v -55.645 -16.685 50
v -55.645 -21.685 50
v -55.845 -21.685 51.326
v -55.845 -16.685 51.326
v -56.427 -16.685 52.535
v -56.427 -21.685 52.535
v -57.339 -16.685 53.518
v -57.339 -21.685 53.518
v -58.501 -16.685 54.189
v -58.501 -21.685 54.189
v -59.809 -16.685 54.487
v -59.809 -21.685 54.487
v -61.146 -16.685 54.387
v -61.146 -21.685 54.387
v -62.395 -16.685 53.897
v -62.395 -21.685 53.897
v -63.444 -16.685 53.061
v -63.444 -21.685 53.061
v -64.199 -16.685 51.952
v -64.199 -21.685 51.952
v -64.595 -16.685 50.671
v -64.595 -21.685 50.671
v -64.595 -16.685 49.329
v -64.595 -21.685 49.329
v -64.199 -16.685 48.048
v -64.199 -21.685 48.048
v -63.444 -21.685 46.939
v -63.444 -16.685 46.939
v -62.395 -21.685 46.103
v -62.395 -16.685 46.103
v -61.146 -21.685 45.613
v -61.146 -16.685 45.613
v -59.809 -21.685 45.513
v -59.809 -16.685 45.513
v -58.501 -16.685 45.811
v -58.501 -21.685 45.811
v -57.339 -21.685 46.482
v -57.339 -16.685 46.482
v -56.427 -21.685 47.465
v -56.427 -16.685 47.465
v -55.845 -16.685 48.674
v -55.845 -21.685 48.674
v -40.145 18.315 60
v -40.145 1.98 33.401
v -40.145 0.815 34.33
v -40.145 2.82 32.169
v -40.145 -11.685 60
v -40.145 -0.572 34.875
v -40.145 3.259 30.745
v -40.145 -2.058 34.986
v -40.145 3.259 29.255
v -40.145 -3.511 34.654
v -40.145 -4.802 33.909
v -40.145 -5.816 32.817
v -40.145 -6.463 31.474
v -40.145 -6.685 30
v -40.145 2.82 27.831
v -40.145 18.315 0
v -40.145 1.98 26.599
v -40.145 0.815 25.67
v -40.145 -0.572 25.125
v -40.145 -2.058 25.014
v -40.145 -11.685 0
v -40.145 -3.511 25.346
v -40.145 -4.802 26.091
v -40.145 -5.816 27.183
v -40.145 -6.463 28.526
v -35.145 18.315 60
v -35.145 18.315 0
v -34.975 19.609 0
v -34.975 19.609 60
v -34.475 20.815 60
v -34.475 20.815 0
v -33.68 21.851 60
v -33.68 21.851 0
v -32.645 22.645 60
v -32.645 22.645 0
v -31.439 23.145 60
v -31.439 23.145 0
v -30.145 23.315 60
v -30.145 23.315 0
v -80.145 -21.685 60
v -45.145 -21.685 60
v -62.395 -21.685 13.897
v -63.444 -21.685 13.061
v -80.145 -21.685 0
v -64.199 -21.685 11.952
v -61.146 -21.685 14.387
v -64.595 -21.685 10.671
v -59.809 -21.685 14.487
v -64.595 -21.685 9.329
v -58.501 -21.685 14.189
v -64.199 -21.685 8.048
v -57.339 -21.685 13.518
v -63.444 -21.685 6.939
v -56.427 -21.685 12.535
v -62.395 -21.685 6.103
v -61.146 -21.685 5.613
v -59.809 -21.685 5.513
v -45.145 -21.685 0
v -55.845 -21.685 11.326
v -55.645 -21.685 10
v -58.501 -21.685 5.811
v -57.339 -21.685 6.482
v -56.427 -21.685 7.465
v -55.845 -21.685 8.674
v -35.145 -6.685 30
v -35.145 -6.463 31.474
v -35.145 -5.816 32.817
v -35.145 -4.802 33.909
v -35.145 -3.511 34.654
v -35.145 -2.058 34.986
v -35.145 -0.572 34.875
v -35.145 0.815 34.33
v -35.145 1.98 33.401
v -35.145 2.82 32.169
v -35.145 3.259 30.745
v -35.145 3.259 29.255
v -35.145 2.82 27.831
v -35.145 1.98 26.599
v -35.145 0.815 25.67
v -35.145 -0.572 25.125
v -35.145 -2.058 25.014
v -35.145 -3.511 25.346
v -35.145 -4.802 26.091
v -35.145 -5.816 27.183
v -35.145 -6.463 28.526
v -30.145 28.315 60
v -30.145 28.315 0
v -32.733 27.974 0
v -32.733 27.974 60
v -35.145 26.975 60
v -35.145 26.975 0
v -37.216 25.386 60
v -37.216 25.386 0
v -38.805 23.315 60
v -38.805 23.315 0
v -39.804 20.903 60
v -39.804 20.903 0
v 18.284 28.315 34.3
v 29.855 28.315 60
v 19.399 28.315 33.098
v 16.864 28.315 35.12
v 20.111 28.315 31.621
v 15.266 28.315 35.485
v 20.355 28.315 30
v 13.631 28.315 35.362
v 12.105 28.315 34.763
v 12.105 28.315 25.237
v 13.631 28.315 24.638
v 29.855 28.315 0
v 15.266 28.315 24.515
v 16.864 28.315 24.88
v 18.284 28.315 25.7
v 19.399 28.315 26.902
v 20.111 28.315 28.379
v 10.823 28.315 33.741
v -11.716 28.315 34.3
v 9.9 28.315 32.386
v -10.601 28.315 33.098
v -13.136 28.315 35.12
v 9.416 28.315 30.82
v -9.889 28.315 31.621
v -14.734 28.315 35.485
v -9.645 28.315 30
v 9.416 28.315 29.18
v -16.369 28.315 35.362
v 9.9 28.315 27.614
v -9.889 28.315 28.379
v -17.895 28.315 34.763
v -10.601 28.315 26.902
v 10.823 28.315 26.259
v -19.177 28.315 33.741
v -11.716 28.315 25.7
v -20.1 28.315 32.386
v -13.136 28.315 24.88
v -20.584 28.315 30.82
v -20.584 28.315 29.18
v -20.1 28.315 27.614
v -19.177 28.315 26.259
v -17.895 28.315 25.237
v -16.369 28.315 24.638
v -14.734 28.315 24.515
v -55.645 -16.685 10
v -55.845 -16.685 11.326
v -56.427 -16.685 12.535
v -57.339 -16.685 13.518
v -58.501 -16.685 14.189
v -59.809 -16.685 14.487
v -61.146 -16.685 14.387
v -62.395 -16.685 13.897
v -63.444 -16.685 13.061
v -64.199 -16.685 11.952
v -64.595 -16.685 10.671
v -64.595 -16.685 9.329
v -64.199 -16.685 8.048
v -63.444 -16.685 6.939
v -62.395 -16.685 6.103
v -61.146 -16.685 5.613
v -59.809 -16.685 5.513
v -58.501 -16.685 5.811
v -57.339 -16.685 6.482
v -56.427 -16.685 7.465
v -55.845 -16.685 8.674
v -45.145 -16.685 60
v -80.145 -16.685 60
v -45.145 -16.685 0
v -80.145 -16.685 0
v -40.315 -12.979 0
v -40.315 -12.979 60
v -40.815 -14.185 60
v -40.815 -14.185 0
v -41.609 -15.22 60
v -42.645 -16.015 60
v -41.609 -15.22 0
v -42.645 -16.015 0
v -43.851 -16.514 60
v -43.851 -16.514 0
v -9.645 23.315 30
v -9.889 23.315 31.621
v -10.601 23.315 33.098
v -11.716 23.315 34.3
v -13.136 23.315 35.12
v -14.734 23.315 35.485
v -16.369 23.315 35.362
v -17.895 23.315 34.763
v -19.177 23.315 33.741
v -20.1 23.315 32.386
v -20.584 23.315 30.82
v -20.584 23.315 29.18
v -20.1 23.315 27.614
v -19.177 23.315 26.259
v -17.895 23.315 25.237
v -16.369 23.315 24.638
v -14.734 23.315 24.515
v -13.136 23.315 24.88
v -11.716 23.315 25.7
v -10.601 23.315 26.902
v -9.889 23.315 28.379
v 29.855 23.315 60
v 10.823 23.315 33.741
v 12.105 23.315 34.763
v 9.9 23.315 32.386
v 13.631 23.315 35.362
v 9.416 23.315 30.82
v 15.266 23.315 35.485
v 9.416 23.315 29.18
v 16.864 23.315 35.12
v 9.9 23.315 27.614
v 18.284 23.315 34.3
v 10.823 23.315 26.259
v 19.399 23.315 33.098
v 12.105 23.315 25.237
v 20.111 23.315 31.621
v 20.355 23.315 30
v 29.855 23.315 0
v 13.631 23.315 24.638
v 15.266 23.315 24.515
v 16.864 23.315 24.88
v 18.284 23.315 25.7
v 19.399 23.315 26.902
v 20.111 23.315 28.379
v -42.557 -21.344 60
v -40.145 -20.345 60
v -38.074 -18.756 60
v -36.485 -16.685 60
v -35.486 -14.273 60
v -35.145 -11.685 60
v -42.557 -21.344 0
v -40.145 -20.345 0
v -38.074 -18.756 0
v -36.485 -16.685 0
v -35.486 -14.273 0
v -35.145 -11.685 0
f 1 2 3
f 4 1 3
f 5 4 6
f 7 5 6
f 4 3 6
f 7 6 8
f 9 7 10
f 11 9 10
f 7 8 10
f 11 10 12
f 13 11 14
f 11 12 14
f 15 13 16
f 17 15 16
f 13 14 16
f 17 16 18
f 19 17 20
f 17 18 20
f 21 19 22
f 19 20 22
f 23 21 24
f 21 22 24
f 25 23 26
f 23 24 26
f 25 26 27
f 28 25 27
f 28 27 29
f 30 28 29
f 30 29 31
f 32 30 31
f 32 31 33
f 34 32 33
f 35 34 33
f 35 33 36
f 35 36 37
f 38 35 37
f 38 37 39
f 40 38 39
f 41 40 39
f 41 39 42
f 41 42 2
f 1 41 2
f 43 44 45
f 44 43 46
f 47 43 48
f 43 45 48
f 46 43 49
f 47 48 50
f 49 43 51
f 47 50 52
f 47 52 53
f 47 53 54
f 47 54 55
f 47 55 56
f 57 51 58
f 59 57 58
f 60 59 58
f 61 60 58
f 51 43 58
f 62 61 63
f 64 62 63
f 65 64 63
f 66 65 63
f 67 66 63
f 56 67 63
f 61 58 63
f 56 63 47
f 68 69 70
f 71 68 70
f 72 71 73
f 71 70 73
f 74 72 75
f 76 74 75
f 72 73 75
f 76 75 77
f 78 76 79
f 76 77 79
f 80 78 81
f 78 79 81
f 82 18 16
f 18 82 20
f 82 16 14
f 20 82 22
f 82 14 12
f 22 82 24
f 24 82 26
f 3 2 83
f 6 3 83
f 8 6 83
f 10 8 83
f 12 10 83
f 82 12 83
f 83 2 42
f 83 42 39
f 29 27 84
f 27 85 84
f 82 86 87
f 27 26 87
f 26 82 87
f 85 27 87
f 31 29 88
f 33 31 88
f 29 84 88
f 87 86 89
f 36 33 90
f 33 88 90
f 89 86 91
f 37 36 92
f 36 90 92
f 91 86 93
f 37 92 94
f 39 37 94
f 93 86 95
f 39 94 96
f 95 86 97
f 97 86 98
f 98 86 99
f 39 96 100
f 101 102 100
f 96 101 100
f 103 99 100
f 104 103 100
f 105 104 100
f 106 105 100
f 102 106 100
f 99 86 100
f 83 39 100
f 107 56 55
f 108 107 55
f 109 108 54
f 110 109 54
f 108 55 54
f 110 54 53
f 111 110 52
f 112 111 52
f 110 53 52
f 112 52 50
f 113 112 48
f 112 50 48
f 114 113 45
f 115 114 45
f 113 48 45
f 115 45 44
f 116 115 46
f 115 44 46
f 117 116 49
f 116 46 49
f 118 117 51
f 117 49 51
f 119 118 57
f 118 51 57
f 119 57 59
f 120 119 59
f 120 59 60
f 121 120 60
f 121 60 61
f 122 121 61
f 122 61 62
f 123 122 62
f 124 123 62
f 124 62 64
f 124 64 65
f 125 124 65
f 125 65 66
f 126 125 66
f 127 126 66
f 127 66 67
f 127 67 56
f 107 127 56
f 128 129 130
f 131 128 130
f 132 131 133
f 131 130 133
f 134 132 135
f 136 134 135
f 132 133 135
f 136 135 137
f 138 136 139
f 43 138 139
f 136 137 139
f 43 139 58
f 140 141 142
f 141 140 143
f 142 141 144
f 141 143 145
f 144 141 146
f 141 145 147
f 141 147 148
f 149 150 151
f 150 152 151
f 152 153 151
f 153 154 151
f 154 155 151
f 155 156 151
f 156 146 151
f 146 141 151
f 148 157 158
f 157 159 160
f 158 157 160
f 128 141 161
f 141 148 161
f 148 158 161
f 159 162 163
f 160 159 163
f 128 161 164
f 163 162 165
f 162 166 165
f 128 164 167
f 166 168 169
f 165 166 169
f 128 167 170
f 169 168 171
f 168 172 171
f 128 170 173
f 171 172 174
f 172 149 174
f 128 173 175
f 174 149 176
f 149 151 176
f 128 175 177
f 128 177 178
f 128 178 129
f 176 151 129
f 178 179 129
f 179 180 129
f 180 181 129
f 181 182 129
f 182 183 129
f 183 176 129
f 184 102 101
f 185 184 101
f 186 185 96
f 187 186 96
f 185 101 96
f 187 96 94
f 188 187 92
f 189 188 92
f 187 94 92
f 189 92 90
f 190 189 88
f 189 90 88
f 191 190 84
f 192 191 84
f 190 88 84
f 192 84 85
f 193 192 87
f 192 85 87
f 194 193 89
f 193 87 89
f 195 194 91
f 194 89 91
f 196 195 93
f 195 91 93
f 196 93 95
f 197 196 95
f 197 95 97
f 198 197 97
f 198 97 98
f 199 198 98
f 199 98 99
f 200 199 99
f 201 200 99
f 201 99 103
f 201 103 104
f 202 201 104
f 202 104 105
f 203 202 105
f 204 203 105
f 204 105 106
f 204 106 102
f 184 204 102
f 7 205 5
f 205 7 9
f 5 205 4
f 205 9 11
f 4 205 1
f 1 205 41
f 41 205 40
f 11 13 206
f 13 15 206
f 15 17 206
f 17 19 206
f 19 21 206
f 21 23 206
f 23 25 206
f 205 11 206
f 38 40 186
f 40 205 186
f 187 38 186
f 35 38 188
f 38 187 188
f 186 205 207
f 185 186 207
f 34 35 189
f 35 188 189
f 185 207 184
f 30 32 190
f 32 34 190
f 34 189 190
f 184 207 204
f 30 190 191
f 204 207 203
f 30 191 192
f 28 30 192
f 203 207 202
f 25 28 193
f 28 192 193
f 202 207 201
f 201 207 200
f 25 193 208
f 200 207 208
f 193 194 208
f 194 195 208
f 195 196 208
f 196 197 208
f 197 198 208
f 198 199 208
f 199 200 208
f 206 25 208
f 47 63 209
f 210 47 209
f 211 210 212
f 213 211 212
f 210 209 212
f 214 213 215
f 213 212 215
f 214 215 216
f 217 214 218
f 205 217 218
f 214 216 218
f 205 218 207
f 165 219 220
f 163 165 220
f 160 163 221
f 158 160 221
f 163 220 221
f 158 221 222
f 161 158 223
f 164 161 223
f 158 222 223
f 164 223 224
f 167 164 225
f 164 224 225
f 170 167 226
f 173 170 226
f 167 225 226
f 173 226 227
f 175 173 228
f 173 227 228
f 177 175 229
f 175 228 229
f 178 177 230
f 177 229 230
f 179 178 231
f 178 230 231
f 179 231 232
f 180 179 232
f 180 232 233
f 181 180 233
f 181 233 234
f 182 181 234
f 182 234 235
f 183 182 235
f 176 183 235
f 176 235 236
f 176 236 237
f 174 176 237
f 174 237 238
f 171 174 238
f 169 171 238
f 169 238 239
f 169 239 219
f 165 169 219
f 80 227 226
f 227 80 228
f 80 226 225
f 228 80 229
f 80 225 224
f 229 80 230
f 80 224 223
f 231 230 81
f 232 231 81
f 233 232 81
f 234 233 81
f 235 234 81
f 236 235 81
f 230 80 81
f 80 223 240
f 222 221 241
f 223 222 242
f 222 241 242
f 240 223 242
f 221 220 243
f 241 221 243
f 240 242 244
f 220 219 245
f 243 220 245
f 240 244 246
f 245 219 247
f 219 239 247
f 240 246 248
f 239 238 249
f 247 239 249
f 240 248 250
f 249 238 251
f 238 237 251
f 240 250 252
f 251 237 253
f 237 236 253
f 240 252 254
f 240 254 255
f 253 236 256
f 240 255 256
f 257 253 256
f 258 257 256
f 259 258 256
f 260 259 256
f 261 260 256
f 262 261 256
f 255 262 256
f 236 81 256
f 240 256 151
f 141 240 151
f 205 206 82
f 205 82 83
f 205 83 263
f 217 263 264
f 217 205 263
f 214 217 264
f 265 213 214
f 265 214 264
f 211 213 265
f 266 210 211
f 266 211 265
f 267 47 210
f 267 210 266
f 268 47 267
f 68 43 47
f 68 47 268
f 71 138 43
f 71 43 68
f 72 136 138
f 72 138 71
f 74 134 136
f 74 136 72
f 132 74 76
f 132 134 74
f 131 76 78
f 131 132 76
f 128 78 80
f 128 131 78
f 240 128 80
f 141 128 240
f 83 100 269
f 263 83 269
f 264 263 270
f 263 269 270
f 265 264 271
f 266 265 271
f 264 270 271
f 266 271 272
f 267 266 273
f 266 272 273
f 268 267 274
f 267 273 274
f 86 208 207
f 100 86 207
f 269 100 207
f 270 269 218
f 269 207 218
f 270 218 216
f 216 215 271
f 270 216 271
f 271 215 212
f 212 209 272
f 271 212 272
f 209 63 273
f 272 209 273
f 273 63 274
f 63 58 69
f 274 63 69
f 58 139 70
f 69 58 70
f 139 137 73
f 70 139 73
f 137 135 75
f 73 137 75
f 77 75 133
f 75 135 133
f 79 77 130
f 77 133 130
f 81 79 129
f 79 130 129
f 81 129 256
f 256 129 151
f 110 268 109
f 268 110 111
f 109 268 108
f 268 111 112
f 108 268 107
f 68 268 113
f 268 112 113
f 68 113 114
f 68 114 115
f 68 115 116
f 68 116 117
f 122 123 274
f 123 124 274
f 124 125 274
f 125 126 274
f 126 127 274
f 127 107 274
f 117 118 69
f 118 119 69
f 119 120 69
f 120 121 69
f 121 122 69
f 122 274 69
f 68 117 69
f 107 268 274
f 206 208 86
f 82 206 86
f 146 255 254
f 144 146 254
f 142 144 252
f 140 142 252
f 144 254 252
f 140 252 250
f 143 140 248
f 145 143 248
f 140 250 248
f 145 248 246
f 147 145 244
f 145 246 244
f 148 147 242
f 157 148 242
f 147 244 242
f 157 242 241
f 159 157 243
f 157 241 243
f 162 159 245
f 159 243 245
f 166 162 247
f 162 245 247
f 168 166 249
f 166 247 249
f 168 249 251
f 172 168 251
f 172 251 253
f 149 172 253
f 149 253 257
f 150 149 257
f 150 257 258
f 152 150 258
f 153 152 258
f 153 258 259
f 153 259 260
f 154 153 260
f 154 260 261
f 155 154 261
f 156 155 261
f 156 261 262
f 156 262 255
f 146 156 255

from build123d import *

# Parameters (mm, degrees)
F1_DEPTH = 60
F2_R     = 4.5
F3_DEPTH = 25
F4_R     = 5.5
F5_DEPTH = 25
F6_R     = 5
F7_DEPTH = 25


with BuildPart() as f1:
    # F0 (on Top) → F1 (new body)
    with BuildSketch(Plane.XY):
        with BuildLine():
            Line((-30.144934, 23.315217), (29.855066, 23.315217))
            Line((29.855066, 23.315217), (29.855066, 28.315217))
            Line((29.855066, 28.315217), (-30.144934, 28.315217))
            ThreePointArc((-30.144934, 28.315217), (-37.216002, 25.386285), (-40.144934, 18.315217))
            Line((-40.144934, 18.315217), (-40.144934, -11.684783))
            ThreePointArc((-40.144934, -11.684783), (-41.6094, -15.220316), (-45.144934, -16.684783))
            Line((-45.144934, -16.684783), (-80.144934, -16.684783))
            Line((-80.144934, -16.684783), (-80.144934, -21.684783))
            Line((-80.144934, -21.684783), (-45.144934, -21.684783))
            ThreePointArc((-45.144934, -21.684783), (-38.073867, -18.75585), (-35.144934, -11.684783))
            Line((-35.144934, -11.684783), (-35.144934, 18.315217))
            ThreePointArc((-35.144934, 18.315217), (-33.680468, 21.850751), (-30.144934, 23.315217))
        make_face()
    extrude(amount=F1_DEPTH)

    # F2 (on face) → F3 (cut)
    with BuildSketch(Plane.XZ.offset(21.684783)):
        with Locations((-60.144934, 50)):
            Circle(F2_R)
        with Locations((-60.144934, 10)):
            Circle(F2_R)
    extrude(amount=-F3_DEPTH, mode=Mode.SUBTRACT)

    # F4 (on face) → F5 (cut)
    with BuildSketch(Plane.XZ.offset(-23.315217)):
        with Locations((14.855066, 30)):
            Circle(F4_R)
        with Locations((-15.144934, 30)):
            Circle(F4_R)
    extrude(amount=-F5_DEPTH, mode=Mode.SUBTRACT)

    # F6 (on face) → F7 (cut)
    with BuildSketch(Plane(origin=(-40.144934, 0, 0), x_dir=(0, -1, 0), z_dir=(-1, 0, 0))):
        with Locations((1.684783, 30)):
            Circle(F6_R)
    extrude(amount=-F7_DEPTH, mode=Mode.SUBTRACT)


solid = f1.part
